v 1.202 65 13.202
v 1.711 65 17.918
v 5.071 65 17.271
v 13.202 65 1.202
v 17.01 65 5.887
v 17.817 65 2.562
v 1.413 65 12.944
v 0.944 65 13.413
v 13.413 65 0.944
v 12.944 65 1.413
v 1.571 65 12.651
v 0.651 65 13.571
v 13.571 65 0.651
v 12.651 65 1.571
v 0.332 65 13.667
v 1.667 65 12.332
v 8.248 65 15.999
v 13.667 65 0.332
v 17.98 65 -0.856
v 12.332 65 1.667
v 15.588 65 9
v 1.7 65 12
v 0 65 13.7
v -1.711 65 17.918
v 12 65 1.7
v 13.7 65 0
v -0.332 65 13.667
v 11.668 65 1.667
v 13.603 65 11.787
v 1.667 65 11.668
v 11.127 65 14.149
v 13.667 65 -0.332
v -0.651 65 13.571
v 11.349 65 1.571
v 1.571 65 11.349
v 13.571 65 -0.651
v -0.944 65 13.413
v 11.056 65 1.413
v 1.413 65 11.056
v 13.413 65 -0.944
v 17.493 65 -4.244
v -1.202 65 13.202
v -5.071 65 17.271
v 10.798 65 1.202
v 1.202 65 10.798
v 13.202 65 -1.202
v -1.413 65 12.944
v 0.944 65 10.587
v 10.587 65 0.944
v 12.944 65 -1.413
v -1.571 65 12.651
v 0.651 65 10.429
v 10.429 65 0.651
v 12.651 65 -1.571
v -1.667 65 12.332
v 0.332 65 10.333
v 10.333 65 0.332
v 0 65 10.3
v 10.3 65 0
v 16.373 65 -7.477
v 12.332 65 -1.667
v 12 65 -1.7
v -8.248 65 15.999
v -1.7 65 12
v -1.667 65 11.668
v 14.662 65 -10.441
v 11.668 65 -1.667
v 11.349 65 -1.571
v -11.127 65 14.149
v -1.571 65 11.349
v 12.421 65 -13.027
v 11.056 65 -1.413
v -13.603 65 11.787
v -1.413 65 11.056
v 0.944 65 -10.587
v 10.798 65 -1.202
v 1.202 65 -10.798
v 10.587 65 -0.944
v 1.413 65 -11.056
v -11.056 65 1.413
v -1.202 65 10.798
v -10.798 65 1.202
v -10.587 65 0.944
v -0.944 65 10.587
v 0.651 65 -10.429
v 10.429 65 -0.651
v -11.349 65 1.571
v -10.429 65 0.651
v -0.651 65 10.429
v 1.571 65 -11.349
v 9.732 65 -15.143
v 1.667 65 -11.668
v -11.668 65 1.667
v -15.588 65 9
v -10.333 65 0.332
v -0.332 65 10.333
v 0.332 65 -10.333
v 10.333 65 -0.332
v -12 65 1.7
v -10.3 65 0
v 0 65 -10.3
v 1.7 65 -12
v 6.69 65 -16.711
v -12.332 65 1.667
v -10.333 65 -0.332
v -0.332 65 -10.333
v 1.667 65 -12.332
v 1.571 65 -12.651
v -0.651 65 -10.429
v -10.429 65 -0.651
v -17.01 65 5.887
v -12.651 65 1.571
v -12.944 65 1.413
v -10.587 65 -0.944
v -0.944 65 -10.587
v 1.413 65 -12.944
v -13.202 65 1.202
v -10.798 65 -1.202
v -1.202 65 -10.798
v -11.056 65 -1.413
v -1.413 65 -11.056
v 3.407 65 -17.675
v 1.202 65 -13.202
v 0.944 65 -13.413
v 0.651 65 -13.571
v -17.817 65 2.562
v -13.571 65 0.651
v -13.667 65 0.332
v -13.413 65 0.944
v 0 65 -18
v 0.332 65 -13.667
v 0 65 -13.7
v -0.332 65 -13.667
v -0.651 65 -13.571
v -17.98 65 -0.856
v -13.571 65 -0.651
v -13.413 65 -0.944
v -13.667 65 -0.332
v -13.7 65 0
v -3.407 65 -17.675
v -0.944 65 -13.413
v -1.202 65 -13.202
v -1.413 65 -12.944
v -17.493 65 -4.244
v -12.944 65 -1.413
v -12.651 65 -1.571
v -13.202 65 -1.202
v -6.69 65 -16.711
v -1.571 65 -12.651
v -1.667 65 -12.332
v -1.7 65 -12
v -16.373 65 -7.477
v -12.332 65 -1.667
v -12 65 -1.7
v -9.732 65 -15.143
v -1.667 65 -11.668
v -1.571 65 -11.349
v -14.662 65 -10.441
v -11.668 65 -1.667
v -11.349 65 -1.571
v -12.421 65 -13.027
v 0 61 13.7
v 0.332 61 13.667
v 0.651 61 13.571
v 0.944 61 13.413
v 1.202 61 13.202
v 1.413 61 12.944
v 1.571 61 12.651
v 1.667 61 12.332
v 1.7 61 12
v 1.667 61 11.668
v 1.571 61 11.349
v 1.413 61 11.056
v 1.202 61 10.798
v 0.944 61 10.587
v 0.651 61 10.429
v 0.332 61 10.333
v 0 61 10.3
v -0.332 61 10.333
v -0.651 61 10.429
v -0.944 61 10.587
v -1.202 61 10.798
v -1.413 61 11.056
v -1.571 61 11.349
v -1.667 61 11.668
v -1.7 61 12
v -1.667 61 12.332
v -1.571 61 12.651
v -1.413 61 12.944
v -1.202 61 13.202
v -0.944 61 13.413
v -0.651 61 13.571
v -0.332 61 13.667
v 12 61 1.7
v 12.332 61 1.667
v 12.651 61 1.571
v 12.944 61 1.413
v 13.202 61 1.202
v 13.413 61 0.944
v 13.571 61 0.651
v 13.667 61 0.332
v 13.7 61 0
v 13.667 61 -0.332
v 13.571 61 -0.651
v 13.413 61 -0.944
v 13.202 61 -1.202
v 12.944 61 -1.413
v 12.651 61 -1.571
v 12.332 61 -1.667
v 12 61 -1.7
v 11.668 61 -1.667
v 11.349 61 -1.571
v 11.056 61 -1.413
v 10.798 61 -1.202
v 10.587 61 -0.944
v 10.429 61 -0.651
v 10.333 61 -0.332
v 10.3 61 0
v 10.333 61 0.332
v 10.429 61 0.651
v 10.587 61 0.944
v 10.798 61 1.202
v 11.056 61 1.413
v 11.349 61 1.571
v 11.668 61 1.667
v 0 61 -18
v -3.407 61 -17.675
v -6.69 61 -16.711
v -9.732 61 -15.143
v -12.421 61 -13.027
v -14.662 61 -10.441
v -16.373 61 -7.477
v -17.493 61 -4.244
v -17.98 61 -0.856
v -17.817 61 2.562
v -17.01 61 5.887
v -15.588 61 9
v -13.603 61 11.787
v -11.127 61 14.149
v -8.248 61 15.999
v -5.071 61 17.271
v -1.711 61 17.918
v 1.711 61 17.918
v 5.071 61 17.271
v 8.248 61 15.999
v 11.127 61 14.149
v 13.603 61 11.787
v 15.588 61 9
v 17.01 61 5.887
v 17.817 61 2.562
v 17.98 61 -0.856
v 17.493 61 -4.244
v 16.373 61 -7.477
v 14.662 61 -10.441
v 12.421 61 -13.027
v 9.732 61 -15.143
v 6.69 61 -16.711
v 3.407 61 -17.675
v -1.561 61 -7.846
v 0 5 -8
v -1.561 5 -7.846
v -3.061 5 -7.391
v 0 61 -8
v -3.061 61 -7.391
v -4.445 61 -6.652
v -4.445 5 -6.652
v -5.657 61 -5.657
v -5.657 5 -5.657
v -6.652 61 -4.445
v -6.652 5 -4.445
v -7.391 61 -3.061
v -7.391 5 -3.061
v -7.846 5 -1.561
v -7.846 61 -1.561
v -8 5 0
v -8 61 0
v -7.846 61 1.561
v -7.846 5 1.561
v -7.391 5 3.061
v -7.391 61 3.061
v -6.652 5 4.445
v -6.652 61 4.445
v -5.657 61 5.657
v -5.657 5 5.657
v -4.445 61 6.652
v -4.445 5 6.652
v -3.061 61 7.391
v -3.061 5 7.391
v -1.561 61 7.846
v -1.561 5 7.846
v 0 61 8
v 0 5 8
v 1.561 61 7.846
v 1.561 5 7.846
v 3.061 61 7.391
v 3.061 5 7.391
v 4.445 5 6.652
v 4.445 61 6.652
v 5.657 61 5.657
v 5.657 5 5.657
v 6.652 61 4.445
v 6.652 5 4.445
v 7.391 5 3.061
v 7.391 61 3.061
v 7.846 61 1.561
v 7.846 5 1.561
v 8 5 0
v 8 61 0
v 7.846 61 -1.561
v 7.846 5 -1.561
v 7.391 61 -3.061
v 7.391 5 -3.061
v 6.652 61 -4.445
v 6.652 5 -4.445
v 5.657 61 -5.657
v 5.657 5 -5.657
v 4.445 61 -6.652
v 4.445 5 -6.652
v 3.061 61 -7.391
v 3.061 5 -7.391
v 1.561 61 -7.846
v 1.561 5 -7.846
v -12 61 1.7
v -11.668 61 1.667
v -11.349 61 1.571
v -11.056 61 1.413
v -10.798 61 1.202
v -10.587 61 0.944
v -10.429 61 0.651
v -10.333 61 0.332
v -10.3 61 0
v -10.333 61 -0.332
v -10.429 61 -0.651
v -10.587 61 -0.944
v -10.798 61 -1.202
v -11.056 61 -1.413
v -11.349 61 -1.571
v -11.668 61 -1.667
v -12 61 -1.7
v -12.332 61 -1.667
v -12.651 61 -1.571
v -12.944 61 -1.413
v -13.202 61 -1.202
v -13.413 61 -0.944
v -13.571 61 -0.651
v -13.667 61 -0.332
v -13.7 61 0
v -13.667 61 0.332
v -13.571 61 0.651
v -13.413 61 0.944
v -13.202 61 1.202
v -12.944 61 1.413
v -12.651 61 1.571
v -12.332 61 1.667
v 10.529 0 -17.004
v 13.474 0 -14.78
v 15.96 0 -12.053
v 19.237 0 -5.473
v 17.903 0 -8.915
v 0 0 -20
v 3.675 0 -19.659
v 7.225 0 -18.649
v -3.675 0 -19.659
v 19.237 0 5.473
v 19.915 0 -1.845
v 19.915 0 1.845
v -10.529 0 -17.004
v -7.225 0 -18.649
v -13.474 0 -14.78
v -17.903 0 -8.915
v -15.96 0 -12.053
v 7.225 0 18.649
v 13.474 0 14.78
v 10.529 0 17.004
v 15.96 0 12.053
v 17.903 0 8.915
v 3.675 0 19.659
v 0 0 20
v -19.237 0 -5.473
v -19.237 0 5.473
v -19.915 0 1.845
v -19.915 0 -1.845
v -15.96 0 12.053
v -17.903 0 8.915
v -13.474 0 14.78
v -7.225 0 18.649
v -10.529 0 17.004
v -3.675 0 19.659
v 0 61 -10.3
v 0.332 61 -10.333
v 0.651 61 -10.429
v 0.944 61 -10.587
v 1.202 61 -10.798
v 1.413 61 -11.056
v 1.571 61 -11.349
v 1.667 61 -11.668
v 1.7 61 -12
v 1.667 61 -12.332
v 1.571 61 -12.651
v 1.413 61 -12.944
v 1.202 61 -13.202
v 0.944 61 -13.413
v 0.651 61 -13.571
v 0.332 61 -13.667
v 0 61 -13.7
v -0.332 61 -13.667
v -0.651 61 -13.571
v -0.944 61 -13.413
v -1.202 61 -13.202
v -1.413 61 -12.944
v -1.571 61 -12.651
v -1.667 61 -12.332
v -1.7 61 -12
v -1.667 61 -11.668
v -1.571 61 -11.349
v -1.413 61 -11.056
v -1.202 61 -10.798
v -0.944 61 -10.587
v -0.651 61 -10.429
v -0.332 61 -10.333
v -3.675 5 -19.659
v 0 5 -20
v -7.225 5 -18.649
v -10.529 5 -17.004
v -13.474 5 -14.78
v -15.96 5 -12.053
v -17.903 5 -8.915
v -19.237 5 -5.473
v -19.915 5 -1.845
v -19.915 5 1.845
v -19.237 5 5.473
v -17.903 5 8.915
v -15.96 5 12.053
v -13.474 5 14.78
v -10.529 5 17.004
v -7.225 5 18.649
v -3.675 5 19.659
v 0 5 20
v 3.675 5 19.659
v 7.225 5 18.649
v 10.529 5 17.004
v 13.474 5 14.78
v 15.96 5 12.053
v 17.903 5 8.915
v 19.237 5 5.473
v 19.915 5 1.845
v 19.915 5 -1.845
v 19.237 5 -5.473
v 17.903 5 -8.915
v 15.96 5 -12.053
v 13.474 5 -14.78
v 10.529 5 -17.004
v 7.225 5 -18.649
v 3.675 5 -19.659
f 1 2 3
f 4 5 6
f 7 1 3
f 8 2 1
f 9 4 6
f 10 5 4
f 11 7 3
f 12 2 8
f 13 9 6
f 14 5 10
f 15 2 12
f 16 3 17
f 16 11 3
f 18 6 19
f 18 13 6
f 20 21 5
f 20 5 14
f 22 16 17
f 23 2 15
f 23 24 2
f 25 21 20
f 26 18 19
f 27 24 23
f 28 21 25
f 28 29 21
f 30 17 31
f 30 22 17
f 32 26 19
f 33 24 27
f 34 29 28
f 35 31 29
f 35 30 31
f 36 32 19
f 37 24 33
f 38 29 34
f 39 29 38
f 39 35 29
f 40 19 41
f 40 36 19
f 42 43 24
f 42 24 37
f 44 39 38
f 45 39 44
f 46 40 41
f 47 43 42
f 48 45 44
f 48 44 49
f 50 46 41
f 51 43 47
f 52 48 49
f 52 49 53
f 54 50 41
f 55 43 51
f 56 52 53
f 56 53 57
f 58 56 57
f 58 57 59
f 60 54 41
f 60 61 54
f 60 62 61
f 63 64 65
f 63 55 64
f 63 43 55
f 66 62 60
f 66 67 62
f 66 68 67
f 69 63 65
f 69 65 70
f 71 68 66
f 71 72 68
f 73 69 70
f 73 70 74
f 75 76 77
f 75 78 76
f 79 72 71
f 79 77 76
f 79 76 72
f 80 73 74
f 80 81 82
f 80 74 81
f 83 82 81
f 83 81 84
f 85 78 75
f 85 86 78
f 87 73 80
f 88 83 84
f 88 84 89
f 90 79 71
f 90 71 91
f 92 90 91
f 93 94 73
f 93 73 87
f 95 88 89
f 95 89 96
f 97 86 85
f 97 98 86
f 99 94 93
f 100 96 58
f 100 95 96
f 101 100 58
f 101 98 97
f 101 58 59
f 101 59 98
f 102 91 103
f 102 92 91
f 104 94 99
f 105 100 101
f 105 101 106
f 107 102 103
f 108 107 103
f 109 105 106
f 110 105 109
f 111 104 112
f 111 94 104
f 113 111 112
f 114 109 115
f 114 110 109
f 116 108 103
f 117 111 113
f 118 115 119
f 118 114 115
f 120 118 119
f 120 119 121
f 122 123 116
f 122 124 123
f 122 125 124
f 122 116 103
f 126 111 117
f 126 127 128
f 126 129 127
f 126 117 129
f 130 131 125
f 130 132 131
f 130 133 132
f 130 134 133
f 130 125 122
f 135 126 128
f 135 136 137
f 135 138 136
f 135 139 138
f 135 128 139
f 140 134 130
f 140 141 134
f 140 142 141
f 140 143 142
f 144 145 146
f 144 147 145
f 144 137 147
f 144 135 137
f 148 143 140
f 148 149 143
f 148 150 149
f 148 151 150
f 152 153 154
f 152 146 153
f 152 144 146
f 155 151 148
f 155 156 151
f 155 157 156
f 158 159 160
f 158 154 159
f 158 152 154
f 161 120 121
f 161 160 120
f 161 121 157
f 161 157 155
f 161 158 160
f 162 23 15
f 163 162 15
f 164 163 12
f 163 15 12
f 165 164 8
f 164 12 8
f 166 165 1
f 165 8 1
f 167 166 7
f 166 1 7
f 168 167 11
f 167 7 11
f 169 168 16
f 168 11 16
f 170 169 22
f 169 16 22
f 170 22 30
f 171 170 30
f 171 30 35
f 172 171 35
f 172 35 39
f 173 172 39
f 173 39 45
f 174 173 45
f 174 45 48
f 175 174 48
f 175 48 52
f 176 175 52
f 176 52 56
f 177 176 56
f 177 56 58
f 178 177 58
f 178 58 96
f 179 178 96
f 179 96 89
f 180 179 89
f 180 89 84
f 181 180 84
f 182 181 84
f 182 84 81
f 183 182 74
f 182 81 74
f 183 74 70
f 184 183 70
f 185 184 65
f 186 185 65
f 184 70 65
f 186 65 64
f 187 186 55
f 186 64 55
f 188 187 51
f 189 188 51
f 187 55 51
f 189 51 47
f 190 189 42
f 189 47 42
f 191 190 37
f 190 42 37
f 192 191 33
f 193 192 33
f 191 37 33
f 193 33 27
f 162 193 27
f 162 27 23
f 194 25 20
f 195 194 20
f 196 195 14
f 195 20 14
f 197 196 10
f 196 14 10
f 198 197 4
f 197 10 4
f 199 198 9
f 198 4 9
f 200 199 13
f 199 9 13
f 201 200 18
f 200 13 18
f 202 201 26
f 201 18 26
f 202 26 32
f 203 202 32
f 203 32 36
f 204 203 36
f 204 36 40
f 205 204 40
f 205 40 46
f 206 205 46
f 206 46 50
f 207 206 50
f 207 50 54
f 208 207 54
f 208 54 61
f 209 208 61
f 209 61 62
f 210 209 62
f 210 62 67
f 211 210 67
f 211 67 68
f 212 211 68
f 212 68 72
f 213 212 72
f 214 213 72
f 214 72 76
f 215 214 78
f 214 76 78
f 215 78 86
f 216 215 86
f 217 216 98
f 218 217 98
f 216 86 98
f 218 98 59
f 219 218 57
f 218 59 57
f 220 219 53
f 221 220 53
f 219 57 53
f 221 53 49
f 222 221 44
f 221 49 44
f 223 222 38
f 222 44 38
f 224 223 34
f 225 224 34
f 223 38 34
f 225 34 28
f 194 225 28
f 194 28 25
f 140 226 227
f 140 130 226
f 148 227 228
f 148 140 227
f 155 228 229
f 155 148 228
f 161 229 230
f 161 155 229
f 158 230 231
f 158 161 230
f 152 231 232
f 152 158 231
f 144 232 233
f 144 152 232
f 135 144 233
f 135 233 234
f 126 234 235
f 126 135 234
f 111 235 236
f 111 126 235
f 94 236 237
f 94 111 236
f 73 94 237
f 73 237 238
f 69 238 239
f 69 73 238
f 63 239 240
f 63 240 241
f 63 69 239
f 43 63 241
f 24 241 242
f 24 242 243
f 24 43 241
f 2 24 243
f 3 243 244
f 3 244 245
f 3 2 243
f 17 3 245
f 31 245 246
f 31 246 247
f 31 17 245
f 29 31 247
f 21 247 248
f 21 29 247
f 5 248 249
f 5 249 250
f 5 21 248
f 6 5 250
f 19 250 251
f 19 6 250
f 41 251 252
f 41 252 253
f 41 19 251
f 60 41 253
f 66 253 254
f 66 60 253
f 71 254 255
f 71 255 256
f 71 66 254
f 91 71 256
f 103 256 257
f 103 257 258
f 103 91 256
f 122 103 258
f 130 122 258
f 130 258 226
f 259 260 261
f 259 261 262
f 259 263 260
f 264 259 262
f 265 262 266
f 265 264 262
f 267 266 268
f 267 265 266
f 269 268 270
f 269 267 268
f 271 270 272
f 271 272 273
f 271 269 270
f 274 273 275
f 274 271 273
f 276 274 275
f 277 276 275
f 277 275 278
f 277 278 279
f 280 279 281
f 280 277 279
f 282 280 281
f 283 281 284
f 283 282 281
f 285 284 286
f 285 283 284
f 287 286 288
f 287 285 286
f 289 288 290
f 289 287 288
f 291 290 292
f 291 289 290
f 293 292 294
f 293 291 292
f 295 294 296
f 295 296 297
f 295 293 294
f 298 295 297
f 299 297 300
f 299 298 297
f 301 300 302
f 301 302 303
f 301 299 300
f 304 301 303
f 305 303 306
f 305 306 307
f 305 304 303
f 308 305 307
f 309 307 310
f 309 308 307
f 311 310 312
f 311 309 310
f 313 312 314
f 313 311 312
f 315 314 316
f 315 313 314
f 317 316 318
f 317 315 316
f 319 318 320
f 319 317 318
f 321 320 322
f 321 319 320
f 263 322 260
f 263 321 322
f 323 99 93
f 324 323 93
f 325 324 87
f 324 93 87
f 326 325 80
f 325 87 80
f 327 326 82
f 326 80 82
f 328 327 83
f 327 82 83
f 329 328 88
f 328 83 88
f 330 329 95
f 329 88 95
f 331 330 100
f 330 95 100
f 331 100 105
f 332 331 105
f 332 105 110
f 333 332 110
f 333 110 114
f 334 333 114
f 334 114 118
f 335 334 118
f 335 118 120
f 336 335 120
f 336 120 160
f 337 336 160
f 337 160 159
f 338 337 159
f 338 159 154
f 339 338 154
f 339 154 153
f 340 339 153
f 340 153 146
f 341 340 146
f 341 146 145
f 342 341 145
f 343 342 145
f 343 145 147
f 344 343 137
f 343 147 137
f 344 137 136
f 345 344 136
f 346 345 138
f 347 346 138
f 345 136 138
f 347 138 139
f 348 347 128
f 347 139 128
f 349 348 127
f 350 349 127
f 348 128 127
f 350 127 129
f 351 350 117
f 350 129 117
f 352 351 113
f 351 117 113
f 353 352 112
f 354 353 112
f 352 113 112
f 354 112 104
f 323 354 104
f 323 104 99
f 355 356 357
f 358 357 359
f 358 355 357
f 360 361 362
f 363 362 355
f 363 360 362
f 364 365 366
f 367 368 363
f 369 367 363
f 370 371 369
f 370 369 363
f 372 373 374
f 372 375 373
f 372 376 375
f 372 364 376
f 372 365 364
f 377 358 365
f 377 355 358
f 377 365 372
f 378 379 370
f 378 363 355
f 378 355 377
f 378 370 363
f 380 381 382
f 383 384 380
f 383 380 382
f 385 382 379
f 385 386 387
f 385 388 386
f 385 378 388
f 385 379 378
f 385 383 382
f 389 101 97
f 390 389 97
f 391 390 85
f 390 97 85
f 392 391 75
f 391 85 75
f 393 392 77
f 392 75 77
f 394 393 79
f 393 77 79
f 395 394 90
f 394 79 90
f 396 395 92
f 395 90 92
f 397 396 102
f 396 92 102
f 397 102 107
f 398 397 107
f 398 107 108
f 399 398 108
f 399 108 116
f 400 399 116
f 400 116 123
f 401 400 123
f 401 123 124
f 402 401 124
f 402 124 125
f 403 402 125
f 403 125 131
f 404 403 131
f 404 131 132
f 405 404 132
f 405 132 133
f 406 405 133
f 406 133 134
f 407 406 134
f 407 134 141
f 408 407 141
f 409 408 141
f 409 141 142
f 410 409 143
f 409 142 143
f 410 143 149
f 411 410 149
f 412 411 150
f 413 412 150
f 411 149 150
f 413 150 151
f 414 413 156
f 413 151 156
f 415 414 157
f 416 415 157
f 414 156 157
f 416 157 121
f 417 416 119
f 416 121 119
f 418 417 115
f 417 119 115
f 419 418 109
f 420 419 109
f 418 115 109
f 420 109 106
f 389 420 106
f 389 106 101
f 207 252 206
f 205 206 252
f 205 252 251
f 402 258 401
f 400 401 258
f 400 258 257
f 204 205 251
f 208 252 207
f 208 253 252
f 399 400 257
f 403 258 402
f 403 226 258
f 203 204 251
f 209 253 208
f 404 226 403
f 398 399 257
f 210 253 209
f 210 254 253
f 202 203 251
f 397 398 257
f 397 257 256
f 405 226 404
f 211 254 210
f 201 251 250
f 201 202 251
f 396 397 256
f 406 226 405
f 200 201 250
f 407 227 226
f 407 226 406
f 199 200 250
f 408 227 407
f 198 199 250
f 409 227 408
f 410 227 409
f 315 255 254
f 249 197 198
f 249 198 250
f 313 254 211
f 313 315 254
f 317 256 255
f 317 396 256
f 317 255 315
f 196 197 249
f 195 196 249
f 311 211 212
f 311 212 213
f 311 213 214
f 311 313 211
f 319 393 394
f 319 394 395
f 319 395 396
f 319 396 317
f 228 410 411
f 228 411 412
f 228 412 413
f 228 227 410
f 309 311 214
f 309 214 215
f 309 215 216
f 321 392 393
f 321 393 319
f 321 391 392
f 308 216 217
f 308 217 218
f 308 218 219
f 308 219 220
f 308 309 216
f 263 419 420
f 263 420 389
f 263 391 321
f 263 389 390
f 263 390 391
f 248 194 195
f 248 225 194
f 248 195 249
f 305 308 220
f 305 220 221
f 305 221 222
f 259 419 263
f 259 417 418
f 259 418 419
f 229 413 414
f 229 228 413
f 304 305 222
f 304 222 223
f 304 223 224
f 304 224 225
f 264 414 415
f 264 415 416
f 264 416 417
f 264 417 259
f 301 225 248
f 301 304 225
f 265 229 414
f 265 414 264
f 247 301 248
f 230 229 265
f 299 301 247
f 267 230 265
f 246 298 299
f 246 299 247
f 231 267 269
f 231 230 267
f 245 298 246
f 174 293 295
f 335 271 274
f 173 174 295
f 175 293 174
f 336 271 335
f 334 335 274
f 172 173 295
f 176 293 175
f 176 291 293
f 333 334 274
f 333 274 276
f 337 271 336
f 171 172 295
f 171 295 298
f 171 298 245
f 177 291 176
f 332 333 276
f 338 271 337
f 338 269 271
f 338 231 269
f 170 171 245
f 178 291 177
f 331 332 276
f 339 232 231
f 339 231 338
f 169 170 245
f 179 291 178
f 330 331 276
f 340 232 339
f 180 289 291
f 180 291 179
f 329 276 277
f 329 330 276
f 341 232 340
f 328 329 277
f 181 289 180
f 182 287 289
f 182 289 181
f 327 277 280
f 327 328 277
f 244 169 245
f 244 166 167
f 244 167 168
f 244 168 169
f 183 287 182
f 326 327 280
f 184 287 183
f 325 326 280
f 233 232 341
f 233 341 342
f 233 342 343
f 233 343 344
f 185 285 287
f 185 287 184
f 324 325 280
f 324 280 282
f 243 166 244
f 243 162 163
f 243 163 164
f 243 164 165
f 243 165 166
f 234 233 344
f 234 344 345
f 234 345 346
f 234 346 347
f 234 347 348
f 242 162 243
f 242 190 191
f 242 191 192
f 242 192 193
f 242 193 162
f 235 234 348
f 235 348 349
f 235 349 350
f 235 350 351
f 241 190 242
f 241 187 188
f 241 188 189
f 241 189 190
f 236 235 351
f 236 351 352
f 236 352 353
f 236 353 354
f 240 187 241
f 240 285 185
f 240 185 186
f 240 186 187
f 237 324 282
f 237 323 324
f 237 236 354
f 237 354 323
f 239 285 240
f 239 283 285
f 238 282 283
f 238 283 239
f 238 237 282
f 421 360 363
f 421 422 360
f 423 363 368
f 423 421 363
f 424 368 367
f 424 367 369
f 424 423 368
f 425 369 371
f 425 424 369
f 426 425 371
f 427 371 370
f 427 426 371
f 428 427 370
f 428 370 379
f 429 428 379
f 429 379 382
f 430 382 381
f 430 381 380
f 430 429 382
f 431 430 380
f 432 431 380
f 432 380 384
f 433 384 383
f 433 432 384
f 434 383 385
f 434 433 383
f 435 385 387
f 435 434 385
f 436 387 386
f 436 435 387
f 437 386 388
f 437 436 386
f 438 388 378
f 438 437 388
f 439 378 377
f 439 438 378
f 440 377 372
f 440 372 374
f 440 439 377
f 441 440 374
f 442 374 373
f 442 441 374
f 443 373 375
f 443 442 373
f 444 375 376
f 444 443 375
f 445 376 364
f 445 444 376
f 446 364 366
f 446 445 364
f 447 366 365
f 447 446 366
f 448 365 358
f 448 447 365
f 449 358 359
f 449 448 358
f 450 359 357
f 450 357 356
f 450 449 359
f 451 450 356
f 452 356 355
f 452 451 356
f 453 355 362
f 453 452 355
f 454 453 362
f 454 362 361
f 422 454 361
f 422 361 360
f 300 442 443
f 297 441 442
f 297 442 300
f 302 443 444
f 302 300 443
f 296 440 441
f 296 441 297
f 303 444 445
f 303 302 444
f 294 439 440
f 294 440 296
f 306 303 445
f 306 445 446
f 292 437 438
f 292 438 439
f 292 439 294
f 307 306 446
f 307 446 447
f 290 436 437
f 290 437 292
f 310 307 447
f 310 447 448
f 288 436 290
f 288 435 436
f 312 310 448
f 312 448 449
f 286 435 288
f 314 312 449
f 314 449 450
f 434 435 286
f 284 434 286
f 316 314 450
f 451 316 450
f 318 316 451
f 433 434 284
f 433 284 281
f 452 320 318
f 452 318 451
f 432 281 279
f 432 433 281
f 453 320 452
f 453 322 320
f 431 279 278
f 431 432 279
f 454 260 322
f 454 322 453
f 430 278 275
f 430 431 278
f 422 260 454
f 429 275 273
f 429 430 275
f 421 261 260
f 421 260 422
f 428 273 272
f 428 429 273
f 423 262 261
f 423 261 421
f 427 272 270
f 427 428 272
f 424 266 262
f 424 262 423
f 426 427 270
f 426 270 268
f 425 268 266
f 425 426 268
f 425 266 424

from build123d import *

# Parameters (mm, degrees)
SKETCH_2_R          = 1.7
CUT_EXTRUDE_1_DEPTH = 10


with BuildPart() as part:
    # 草图1 → 旋转1 (revolve)
    with BuildSketch(Plane.XY, mode=Mode.PRIVATE) as revolve_1_sk:
        Polygon((0, 0), (-20, 0), (-20, 5), (-8, 5), (-8, 61), (-18, 61), (-18, 65), (0, 65), align=None)
    revolve(revolve_1_sk.sketch.rotate(Axis((0, 0, 0), (0, 1, 0)), 270), axis=Axis((0, 0, 0), (0, 1, 0)))

    # 草图2 → 切除-拉伸1 (cut)
    with BuildSketch(Plane(origin=(0, 65, 0), x_dir=(1, 0, 0), z_dir=(0, 1, 0))):
        with Locations(Location((12, 0, 0), (0, 0, 270))):
            Circle(SKETCH_2_R)
        with Locations(Location((0, -12, 0), (0, 0, 270))):
            Circle(SKETCH_2_R)
        with Locations(Location((-12, 0, 0), (0, 0, 270))):
            Circle(SKETCH_2_R)
        with Locations(Location((0, 12, 0), (0, 0, 270))):
            Circle(SKETCH_2_R)
    extrude(amount=-CUT_EXTRUDE_1_DEPTH, mode=Mode.SUBTRACT)


solid = part.part
